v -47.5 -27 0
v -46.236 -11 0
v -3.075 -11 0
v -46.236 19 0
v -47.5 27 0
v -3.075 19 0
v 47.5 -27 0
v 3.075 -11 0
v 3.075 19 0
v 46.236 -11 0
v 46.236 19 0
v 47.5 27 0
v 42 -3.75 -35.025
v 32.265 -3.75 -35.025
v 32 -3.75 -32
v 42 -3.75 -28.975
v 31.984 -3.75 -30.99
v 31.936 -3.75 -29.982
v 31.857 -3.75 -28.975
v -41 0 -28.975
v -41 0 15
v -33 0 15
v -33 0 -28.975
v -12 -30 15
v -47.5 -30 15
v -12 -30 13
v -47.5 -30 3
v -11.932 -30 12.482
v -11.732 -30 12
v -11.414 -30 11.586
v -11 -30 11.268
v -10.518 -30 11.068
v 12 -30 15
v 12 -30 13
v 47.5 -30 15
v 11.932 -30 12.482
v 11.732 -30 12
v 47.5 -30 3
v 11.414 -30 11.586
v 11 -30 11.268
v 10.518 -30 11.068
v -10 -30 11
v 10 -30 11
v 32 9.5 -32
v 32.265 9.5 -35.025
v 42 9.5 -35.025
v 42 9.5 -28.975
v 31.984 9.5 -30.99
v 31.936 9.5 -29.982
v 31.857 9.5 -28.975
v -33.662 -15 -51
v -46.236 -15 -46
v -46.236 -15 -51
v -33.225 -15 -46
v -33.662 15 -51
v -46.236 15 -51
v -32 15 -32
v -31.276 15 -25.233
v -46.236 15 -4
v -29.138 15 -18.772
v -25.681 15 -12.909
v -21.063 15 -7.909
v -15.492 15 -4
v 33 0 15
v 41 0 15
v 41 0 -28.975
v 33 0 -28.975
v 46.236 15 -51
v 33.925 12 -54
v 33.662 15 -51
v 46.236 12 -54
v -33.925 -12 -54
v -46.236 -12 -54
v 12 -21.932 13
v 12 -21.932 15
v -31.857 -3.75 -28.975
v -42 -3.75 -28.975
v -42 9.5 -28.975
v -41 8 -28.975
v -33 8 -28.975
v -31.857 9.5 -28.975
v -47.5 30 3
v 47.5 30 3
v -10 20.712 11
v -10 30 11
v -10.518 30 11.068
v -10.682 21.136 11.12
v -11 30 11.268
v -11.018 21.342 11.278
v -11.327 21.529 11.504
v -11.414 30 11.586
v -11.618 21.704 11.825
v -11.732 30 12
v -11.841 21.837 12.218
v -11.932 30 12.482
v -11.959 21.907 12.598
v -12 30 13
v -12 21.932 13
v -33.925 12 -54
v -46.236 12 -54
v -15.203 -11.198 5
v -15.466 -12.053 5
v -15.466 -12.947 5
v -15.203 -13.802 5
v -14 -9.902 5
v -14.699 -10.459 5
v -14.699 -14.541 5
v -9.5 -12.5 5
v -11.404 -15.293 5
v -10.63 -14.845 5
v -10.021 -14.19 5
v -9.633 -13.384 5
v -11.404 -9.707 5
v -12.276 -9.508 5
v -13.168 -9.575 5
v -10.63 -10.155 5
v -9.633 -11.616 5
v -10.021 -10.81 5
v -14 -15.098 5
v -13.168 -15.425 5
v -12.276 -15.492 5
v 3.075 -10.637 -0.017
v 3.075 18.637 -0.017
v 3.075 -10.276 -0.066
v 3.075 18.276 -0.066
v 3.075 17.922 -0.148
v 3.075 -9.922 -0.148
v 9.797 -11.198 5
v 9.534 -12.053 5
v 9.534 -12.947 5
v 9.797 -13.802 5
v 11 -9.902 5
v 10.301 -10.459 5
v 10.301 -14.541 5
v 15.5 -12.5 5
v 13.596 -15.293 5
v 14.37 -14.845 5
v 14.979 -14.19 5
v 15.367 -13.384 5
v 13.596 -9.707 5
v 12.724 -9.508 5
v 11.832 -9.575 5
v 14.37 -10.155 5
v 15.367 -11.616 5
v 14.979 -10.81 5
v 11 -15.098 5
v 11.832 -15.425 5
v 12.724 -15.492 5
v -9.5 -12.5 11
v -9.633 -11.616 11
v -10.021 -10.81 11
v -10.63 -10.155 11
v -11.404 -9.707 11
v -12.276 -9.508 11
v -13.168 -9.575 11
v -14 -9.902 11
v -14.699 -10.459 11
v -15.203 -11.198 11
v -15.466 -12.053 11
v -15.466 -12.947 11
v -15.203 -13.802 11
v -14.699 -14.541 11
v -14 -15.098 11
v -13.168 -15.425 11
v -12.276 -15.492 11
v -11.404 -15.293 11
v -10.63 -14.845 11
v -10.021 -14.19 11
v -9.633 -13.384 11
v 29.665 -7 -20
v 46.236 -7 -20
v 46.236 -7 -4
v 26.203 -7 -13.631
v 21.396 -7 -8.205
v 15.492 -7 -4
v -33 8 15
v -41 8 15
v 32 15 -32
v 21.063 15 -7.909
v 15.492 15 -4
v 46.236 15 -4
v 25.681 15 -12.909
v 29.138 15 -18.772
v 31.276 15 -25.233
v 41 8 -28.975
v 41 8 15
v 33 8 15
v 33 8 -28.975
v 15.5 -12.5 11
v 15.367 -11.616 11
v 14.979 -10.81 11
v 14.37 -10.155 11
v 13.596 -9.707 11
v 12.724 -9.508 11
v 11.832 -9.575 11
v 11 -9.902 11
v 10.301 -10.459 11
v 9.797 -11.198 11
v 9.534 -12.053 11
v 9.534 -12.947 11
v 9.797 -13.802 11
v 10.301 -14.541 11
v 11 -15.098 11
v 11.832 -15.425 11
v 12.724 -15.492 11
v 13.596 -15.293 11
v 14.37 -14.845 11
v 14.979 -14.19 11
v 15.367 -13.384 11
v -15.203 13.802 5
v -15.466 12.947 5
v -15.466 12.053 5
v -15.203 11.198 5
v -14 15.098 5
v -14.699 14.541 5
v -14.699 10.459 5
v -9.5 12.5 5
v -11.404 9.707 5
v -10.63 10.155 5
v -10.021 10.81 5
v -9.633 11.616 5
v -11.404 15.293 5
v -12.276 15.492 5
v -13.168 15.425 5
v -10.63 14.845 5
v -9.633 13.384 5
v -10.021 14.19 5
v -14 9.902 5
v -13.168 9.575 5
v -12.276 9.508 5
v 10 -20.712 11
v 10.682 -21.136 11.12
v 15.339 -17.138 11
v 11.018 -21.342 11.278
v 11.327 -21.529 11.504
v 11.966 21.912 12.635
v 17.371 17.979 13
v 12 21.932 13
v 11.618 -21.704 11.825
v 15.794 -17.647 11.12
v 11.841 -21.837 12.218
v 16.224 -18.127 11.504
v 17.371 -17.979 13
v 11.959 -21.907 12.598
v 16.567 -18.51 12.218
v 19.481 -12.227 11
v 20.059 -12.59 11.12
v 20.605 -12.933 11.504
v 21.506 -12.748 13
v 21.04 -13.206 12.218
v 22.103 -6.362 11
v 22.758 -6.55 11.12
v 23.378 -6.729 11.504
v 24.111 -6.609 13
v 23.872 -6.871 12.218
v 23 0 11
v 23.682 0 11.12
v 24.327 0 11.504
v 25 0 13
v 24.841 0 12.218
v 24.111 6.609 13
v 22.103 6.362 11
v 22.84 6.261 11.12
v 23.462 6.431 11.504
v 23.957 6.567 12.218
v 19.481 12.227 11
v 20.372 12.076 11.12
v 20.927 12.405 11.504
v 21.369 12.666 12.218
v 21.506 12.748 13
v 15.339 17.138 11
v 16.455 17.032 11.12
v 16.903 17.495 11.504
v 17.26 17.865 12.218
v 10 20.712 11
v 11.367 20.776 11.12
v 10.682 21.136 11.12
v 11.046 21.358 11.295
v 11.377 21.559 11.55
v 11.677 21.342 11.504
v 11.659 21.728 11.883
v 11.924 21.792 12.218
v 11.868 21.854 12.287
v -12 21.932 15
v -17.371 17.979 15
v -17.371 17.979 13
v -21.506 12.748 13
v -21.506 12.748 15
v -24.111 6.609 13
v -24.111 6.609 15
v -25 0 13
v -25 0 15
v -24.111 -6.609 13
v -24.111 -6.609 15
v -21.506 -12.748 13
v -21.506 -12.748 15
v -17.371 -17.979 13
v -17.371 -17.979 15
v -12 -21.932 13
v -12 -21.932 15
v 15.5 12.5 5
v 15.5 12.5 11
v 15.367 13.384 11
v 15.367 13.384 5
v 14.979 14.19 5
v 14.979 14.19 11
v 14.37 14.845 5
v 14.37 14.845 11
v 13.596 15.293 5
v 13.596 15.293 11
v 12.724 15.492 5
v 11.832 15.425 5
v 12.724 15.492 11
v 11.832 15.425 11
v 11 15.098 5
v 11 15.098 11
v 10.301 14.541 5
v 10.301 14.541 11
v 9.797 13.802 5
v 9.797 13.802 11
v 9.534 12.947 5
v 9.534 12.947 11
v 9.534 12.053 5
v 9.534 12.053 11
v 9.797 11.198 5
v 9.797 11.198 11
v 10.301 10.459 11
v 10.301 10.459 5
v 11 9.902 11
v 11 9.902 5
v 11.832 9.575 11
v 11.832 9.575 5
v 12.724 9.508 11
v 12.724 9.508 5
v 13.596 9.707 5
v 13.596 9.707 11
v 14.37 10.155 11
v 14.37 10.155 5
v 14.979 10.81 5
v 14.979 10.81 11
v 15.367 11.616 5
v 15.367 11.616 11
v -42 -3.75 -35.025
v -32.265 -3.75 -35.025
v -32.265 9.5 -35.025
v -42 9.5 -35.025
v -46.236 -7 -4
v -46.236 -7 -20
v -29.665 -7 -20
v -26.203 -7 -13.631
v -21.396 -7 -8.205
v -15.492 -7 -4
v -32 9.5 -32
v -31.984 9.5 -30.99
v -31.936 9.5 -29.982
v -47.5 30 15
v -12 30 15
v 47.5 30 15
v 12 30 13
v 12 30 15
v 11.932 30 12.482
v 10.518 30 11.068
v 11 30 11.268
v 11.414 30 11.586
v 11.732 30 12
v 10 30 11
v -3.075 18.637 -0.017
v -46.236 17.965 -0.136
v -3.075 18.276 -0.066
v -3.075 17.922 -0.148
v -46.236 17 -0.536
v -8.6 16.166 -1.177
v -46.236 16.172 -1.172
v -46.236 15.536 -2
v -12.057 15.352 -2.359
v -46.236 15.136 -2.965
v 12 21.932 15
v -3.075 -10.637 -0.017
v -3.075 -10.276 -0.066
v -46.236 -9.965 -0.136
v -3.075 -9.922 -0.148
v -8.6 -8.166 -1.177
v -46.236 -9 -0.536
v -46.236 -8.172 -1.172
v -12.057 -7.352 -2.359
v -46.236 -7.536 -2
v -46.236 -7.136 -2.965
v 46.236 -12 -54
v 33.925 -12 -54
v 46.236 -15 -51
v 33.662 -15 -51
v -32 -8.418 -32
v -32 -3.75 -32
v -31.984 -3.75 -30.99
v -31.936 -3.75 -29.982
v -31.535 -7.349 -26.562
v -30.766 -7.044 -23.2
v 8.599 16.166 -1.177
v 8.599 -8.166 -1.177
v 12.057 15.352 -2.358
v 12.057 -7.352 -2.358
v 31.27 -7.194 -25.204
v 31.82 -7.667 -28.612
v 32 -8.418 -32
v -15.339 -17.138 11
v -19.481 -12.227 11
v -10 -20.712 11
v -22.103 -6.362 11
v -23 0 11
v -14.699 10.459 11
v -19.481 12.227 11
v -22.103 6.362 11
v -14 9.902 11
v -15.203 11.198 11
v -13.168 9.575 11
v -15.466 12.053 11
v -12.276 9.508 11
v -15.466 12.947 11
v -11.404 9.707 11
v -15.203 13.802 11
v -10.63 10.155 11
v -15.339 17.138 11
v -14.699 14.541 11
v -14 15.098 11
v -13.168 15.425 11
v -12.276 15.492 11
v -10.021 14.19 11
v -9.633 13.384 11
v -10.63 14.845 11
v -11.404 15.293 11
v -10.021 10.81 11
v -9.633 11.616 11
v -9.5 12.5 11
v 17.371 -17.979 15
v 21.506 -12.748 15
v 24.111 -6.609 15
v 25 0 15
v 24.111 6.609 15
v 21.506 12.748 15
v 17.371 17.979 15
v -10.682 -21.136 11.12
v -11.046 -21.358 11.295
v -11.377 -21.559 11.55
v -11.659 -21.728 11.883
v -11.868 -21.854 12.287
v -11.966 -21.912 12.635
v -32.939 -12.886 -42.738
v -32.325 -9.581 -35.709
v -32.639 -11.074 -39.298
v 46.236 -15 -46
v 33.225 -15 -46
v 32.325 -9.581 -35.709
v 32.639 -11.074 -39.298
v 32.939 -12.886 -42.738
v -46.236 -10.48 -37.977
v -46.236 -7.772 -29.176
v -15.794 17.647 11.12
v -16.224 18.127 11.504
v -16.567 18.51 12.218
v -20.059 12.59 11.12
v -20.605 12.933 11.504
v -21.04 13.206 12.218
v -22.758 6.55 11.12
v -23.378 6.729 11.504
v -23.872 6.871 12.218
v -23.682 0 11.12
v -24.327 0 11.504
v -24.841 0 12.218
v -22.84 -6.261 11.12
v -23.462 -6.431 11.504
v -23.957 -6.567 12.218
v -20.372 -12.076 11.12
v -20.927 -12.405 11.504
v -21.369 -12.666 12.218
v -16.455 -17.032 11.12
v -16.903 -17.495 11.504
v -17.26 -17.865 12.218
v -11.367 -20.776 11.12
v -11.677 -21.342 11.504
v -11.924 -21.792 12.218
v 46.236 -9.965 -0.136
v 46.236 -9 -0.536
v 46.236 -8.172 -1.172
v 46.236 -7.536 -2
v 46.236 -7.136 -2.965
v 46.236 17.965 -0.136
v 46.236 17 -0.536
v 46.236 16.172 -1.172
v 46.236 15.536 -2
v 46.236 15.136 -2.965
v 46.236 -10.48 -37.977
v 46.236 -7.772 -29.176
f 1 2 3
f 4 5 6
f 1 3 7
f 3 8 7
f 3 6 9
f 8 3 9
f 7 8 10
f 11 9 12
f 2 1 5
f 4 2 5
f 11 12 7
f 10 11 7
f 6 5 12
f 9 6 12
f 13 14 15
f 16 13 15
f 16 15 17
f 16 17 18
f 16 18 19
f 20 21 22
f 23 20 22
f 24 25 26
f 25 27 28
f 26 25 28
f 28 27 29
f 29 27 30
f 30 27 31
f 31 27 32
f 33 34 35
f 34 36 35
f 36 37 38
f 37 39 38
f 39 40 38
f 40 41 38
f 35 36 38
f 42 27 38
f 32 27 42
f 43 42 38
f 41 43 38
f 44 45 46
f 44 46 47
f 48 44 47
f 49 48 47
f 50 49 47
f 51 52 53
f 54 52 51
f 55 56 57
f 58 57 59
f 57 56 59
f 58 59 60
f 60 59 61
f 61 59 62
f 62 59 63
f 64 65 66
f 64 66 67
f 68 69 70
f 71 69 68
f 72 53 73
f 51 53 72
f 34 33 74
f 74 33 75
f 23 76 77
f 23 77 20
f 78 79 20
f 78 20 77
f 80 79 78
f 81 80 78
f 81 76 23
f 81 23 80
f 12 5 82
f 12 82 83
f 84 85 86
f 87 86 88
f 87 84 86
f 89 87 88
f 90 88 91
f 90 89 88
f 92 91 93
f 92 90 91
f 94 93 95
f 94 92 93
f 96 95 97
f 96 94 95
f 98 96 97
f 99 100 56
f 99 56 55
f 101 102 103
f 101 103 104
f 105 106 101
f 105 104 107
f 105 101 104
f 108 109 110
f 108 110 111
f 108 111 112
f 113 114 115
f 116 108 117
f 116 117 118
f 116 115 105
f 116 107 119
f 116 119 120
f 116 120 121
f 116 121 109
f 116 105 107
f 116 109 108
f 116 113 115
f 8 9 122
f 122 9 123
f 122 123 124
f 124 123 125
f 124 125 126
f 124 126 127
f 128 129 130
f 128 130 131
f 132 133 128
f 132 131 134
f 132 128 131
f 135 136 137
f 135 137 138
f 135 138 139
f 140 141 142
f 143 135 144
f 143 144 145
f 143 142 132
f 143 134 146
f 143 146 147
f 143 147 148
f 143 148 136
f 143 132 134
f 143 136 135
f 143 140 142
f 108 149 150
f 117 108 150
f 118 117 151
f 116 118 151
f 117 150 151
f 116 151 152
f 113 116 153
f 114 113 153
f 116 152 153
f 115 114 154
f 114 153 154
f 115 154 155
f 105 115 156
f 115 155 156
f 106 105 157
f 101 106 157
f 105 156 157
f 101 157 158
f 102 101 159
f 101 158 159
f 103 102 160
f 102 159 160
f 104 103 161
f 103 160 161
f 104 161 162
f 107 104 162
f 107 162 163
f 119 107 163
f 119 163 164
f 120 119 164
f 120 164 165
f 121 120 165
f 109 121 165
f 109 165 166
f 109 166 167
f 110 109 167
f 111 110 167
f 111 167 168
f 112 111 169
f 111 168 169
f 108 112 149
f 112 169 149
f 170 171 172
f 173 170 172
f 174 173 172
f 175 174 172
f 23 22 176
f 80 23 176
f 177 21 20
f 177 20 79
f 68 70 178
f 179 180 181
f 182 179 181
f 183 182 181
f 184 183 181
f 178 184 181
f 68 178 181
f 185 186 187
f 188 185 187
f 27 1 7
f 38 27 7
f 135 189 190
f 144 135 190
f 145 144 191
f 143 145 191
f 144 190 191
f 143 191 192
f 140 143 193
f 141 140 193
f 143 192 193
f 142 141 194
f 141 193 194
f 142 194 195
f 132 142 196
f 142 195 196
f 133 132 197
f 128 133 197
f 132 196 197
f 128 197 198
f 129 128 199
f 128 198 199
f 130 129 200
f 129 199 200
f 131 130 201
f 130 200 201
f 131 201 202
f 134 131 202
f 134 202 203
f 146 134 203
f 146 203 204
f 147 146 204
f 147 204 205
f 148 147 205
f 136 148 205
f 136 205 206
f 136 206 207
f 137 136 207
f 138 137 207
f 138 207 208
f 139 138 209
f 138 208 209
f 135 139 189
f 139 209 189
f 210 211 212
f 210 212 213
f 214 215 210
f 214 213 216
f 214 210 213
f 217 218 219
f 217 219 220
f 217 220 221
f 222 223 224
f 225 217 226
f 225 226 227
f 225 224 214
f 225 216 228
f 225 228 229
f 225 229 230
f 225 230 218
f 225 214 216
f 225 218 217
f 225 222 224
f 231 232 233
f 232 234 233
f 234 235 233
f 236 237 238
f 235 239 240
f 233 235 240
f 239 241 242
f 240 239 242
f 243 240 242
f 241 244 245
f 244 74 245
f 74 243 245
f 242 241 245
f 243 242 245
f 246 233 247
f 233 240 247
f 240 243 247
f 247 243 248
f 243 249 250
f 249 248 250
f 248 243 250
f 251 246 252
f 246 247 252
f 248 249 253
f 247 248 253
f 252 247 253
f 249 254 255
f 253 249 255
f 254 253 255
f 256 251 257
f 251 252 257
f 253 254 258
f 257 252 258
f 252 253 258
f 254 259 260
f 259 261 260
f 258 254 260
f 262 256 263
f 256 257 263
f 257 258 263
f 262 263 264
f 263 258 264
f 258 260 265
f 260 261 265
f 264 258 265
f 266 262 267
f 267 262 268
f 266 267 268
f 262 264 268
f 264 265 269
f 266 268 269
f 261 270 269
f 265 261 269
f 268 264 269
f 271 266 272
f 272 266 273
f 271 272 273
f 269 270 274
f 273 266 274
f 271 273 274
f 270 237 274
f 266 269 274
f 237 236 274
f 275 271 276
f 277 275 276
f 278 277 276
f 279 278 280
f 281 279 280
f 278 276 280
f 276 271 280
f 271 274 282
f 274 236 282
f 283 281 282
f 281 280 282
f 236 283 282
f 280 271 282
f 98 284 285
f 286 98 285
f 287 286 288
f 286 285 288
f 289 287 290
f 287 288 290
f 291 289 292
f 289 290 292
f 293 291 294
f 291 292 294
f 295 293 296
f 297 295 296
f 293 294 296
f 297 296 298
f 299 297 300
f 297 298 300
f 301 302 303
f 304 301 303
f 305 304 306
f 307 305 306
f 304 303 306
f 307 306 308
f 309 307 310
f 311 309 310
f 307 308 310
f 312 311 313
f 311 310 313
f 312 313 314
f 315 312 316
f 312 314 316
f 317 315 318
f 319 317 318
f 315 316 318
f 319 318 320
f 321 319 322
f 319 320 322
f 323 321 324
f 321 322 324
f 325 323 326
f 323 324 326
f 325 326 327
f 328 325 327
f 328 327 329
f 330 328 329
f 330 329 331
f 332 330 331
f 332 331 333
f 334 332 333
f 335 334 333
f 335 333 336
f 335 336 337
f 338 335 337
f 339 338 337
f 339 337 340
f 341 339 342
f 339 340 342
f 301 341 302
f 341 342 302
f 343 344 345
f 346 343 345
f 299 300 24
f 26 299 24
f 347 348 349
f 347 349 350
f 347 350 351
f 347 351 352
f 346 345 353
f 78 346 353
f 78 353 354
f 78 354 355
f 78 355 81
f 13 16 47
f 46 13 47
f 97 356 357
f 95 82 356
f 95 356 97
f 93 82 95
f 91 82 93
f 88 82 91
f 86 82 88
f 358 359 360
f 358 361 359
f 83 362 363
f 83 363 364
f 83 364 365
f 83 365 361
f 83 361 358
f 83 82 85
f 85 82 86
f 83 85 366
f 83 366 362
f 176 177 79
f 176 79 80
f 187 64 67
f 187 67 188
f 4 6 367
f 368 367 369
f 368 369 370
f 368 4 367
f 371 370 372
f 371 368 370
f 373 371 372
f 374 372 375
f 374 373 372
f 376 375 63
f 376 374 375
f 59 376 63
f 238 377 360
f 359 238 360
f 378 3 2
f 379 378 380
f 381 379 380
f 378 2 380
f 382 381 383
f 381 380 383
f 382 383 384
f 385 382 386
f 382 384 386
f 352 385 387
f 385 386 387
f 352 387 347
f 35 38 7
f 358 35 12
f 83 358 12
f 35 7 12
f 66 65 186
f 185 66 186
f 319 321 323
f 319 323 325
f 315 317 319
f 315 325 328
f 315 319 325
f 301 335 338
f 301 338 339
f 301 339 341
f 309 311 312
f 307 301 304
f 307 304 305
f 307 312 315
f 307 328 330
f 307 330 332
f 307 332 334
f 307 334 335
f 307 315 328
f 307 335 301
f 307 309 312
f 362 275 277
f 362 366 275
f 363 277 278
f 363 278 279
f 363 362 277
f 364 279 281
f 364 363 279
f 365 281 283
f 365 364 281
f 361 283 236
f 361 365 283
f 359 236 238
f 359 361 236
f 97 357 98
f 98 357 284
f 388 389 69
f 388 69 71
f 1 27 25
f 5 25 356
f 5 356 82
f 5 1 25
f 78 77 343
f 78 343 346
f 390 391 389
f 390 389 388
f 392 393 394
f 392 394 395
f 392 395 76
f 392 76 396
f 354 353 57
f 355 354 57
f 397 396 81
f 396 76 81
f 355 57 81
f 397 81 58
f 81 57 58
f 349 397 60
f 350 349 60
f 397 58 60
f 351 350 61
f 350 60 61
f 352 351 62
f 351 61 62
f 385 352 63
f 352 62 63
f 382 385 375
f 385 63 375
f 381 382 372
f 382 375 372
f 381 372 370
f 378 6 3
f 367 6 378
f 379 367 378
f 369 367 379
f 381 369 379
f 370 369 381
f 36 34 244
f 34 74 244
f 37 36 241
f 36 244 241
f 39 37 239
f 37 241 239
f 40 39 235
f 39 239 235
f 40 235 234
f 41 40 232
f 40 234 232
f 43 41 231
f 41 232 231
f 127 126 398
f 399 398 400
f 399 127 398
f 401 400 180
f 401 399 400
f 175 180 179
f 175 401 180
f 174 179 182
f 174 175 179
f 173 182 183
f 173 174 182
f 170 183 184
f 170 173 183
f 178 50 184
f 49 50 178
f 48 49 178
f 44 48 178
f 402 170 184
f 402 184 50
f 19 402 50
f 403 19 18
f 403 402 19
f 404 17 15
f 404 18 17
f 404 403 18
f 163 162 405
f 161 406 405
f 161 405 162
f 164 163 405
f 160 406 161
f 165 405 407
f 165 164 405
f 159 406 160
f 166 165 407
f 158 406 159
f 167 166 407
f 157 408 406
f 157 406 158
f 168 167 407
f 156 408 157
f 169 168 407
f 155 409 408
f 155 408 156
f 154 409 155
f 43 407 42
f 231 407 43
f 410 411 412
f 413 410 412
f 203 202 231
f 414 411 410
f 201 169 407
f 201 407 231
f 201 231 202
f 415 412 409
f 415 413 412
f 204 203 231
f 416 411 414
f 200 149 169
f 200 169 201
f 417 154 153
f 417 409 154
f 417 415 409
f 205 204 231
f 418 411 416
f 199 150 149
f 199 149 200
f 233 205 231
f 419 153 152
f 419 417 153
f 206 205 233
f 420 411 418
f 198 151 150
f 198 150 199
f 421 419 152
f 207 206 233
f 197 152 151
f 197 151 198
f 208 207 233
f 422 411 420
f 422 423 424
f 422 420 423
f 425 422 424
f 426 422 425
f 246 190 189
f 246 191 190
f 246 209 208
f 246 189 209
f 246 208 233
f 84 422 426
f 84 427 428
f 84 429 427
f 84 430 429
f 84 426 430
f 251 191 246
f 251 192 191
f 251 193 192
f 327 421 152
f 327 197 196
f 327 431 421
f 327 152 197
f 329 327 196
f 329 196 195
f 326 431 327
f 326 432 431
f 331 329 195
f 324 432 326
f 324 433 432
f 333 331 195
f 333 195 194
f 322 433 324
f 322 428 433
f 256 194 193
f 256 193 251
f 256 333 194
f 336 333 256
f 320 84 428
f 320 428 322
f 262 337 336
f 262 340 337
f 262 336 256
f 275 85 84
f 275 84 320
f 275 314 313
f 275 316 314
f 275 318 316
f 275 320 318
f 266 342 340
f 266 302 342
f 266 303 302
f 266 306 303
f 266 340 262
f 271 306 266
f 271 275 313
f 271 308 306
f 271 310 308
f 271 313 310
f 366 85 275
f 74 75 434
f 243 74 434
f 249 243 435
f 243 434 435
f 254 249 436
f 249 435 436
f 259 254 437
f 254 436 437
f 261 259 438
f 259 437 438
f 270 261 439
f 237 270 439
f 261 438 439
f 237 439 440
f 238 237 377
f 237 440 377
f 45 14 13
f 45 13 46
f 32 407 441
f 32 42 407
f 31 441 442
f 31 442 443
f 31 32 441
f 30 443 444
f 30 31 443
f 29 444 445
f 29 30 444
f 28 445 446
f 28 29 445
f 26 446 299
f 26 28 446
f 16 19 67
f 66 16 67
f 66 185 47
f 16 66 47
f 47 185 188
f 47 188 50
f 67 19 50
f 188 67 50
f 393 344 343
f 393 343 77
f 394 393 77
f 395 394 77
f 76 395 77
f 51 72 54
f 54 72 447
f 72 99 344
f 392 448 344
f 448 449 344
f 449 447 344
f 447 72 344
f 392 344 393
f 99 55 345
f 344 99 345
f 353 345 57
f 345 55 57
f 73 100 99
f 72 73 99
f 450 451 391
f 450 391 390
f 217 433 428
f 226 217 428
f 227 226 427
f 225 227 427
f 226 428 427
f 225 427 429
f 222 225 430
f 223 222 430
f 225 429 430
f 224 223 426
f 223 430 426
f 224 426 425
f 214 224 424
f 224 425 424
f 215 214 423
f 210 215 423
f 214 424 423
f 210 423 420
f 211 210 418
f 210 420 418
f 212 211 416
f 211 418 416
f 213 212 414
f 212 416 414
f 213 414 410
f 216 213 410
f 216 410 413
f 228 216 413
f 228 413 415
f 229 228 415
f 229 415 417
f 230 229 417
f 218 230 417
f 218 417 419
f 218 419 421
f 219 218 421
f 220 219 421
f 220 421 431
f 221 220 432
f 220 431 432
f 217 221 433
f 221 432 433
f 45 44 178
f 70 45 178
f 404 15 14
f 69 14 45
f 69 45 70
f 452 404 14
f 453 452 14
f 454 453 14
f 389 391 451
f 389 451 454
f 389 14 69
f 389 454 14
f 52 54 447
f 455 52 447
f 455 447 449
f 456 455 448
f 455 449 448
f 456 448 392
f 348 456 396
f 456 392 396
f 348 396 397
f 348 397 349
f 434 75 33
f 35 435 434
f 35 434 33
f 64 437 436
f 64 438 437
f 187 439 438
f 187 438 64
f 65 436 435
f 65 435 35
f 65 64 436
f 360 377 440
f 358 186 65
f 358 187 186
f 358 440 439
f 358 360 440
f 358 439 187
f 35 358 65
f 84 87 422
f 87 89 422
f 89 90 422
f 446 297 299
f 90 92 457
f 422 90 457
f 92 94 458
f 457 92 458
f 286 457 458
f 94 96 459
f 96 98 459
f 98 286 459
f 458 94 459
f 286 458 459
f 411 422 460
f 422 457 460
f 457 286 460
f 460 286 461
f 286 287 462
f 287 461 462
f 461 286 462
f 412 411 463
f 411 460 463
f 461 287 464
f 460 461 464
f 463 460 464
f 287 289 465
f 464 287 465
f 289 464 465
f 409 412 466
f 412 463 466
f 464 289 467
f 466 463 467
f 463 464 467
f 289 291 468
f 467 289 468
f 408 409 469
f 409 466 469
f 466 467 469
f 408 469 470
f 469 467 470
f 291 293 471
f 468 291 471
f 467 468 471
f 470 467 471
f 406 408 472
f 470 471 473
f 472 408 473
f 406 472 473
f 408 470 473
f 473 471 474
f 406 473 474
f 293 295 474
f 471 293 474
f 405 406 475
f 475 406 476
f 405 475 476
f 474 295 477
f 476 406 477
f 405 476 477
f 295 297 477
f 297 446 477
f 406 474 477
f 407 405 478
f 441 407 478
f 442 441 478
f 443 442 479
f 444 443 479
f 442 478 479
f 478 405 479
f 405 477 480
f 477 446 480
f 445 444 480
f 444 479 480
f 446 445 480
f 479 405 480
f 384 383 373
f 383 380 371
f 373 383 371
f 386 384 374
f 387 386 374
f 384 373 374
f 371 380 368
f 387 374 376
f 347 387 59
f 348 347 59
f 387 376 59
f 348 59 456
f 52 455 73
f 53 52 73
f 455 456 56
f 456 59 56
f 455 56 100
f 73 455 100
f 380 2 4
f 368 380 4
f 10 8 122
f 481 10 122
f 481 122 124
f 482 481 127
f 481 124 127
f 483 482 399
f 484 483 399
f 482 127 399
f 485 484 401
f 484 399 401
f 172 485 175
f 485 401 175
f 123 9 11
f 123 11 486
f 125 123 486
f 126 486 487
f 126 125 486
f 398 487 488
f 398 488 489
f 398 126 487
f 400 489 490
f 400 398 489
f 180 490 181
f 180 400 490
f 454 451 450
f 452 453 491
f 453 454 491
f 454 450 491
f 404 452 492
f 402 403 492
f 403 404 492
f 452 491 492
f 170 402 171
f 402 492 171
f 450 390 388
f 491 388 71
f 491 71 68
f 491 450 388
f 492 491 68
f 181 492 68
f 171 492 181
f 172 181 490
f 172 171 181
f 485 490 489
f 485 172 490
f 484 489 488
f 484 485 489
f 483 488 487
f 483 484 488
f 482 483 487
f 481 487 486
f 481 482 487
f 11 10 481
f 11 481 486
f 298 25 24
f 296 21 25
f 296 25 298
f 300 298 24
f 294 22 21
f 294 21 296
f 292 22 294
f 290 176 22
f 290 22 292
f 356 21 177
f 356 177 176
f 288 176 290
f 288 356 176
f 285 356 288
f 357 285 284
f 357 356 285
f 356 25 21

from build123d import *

# Parameters (mm, degrees)
F0_W      = 95
F0_H      = 60
F1_DEPTH  = 15
F3_DEPTH  = 15
F5_W      = 13.25
F5_H      = 6.05
F6_DEPTH  = 10
F7_W      = 8
F7_H      = 8
F8_DEPTH  = 29
F11_DEPTH = 93
F12_SIZE  = 3
F14_DEPTH = 4
F15_R     = 3
F16_DEPTH = 6
F17_R     = 2
F18_R     = 4


with BuildPart() as f1:
    # F0 (on Top) → F1 (new body)
    with BuildSketch(Plane.XY):
        Rectangle(F0_W, F0_H)
    extrude(amount=F1_DEPTH)

    # F2 (on Front) → F3 (join, symmetric)
    with BuildSketch(Plane.XZ):
        with BuildLine():
            Line((-3.075, 0), (-46.235655491, 0))
            Line((-46.235655491, 0), (-46.235655491, -54))
            Line((-46.235655491, -54), (-33.9247505976, -54))
            Line((-33.9247505976, -54), (-32, -32))
            ThreePointArc((-32, -32), (-23.6896601917, -10.4872131048), (-3.075, -0.1480867922))
            Line((-3.075, -0.1480867922), (-3.075, 0))
        make_face()
        with BuildLine():
            Line((3.075, 0), (3.075, -0.1480867922))
            ThreePointArc((3.075, -0.1480867922), (23.6896601917, -10.4872131048), (32, -32))
            Line((32, -32), (33.9247505976, -54))
            Line((33.9247505976, -54), (46.235655491, -54))
            Line((46.235655491, -54), (46.235655491, 0))
            Line((46.235655491, 0), (3.075, 0))
        make_face()
    extrude(amount=F3_DEPTH, both=True)

    # F5 (on offset) → F6 (cut, symmetric)
    with BuildSketch(Plane.YZ.offset(-32)):
        with Locations((2.875, -32)):
            Rectangle(F5_W, F5_H)
    extrude(amount=F6_DEPTH, both=True, mode=Mode.SUBTRACT)

    # F7 (on Top) → F8 (cut, symmetric)
    with BuildSketch(Plane.XY):
        with Locations((-37, 4)):
            Rectangle(F7_W, F7_H)
    extrude(amount=F8_DEPTH, both=True, mode=Mode.SUBTRACT)

    # F9: F1 across plane


with BuildPart() as f1_1:
    add(f1.part)
    add(f1.part.mirror(Plane.YZ), mode=Mode.INTERSECT)

    # F10 (on face) → F11 (cut)
    with BuildSketch(Plane.YZ.offset(46.235655491)):
        with BuildLine():
            Line((-7, -20), (-7, 0))
            Line((-7, 0), (-15, 0))
            Line((-15, 0), (-15, -46))
            ThreePointArc((-15, -46), (-8.8897891542, -33.6492956449), (-7, -20))
        make_face()
    extrude(amount=-F11_DEPTH, mode=Mode.SUBTRACT)

    # F12
    f12_edges = [f1_1.edges().sort_by_distance(p)[0] for p in [
        (40.080203, -15, -54),
        (-40.080203, -15, -54),
        (0, -30, 0),
        (0, 30, 0),
        (40.080203, 15, -54),
        (-40.080203, 15, -54),
    ]]
    chamfer(f12_edges, length=F12_SIZE)

    # F13 (on face) → F14 (cut)
    with BuildSketch(Plane.XY.offset(15)):
        with BuildLine():
            Line((-12, 30), (-12, 21.9317121995))
            ThreePointArc((-12, 21.9317121995), (-25, 0), (-12, -21.9317121995))
            Line((-12, -21.9317121995), (-12, -30))
            Line((-12, -30), (12, -30))
            Line((12, -30), (12, -21.9317121995))
            ThreePointArc((12, -21.9317121995), (25, 0), (12, 21.9317121995))
            Line((12, 21.9317121995), (12, 30))
            Line((12, 30), (-12, 30))
        make_face()
    extrude(amount=-F14_DEPTH, mode=Mode.SUBTRACT)

    # F15 (on face) → F16 (cut)
    with BuildSketch(Plane.XY.offset(11)):
        with Locations((12.5, -12.5)):
            Circle(F15_R)
        with Locations((-12.5, -12.5)):
            Circle(F15_R)
        with Locations((-12.5, 12.5)):
            Circle(F15_R)
        with Locations((12.5, 12.5)):
            Circle(F15_R)
    extrude(amount=-F16_DEPTH, mode=Mode.SUBTRACT)

    # F17
    f17_edges = [f1_1.edges().sort_by_distance(p)[0] for p in [
        (-25, 0, 11),
        (25, 0, 11),
        (-12, -25.965856, 11),
        (12, -25.965856, 11),
        (12, 25.965856, 11),
        (-12, 25.965856, 11),
    ]]
    fillet(f17_edges, radius=F17_R)

    # F18 (call 1 of 4: OpenCascade refuses the feature's edges together)
    f18_edges = [f1_1.edges().sort_by_distance(p)[0] for p in [
        (-24.655328, -7, 0),
    ]]
    fillet(f18_edges, radius=F18_R)

    # F18#2 (call 2 of 4)
    f18_2_edges = [f1_1.edges().sort_by_distance(p)[0] for p in [
        (24.655328, -7, 0),
    ]]
    fillet(f18_2_edges, radius=F18_R)

    # F18#3 (call 3 of 4)
    f18_3_edges = [f1_1.edges().sort_by_distance(p)[0] for p in [
        (24.655328, 15, 0),
    ]]
    fillet(f18_3_edges, radius=F18_R)

    # F18#4 (call 4 of 4)
    f18_4_edges = [f1_1.edges().sort_by_distance(p)[0] for p in [
        (-24.655328, 15, 0),
    ]]
    fillet(f18_4_edges, radius=F18_R)


solid = f1_1.part
